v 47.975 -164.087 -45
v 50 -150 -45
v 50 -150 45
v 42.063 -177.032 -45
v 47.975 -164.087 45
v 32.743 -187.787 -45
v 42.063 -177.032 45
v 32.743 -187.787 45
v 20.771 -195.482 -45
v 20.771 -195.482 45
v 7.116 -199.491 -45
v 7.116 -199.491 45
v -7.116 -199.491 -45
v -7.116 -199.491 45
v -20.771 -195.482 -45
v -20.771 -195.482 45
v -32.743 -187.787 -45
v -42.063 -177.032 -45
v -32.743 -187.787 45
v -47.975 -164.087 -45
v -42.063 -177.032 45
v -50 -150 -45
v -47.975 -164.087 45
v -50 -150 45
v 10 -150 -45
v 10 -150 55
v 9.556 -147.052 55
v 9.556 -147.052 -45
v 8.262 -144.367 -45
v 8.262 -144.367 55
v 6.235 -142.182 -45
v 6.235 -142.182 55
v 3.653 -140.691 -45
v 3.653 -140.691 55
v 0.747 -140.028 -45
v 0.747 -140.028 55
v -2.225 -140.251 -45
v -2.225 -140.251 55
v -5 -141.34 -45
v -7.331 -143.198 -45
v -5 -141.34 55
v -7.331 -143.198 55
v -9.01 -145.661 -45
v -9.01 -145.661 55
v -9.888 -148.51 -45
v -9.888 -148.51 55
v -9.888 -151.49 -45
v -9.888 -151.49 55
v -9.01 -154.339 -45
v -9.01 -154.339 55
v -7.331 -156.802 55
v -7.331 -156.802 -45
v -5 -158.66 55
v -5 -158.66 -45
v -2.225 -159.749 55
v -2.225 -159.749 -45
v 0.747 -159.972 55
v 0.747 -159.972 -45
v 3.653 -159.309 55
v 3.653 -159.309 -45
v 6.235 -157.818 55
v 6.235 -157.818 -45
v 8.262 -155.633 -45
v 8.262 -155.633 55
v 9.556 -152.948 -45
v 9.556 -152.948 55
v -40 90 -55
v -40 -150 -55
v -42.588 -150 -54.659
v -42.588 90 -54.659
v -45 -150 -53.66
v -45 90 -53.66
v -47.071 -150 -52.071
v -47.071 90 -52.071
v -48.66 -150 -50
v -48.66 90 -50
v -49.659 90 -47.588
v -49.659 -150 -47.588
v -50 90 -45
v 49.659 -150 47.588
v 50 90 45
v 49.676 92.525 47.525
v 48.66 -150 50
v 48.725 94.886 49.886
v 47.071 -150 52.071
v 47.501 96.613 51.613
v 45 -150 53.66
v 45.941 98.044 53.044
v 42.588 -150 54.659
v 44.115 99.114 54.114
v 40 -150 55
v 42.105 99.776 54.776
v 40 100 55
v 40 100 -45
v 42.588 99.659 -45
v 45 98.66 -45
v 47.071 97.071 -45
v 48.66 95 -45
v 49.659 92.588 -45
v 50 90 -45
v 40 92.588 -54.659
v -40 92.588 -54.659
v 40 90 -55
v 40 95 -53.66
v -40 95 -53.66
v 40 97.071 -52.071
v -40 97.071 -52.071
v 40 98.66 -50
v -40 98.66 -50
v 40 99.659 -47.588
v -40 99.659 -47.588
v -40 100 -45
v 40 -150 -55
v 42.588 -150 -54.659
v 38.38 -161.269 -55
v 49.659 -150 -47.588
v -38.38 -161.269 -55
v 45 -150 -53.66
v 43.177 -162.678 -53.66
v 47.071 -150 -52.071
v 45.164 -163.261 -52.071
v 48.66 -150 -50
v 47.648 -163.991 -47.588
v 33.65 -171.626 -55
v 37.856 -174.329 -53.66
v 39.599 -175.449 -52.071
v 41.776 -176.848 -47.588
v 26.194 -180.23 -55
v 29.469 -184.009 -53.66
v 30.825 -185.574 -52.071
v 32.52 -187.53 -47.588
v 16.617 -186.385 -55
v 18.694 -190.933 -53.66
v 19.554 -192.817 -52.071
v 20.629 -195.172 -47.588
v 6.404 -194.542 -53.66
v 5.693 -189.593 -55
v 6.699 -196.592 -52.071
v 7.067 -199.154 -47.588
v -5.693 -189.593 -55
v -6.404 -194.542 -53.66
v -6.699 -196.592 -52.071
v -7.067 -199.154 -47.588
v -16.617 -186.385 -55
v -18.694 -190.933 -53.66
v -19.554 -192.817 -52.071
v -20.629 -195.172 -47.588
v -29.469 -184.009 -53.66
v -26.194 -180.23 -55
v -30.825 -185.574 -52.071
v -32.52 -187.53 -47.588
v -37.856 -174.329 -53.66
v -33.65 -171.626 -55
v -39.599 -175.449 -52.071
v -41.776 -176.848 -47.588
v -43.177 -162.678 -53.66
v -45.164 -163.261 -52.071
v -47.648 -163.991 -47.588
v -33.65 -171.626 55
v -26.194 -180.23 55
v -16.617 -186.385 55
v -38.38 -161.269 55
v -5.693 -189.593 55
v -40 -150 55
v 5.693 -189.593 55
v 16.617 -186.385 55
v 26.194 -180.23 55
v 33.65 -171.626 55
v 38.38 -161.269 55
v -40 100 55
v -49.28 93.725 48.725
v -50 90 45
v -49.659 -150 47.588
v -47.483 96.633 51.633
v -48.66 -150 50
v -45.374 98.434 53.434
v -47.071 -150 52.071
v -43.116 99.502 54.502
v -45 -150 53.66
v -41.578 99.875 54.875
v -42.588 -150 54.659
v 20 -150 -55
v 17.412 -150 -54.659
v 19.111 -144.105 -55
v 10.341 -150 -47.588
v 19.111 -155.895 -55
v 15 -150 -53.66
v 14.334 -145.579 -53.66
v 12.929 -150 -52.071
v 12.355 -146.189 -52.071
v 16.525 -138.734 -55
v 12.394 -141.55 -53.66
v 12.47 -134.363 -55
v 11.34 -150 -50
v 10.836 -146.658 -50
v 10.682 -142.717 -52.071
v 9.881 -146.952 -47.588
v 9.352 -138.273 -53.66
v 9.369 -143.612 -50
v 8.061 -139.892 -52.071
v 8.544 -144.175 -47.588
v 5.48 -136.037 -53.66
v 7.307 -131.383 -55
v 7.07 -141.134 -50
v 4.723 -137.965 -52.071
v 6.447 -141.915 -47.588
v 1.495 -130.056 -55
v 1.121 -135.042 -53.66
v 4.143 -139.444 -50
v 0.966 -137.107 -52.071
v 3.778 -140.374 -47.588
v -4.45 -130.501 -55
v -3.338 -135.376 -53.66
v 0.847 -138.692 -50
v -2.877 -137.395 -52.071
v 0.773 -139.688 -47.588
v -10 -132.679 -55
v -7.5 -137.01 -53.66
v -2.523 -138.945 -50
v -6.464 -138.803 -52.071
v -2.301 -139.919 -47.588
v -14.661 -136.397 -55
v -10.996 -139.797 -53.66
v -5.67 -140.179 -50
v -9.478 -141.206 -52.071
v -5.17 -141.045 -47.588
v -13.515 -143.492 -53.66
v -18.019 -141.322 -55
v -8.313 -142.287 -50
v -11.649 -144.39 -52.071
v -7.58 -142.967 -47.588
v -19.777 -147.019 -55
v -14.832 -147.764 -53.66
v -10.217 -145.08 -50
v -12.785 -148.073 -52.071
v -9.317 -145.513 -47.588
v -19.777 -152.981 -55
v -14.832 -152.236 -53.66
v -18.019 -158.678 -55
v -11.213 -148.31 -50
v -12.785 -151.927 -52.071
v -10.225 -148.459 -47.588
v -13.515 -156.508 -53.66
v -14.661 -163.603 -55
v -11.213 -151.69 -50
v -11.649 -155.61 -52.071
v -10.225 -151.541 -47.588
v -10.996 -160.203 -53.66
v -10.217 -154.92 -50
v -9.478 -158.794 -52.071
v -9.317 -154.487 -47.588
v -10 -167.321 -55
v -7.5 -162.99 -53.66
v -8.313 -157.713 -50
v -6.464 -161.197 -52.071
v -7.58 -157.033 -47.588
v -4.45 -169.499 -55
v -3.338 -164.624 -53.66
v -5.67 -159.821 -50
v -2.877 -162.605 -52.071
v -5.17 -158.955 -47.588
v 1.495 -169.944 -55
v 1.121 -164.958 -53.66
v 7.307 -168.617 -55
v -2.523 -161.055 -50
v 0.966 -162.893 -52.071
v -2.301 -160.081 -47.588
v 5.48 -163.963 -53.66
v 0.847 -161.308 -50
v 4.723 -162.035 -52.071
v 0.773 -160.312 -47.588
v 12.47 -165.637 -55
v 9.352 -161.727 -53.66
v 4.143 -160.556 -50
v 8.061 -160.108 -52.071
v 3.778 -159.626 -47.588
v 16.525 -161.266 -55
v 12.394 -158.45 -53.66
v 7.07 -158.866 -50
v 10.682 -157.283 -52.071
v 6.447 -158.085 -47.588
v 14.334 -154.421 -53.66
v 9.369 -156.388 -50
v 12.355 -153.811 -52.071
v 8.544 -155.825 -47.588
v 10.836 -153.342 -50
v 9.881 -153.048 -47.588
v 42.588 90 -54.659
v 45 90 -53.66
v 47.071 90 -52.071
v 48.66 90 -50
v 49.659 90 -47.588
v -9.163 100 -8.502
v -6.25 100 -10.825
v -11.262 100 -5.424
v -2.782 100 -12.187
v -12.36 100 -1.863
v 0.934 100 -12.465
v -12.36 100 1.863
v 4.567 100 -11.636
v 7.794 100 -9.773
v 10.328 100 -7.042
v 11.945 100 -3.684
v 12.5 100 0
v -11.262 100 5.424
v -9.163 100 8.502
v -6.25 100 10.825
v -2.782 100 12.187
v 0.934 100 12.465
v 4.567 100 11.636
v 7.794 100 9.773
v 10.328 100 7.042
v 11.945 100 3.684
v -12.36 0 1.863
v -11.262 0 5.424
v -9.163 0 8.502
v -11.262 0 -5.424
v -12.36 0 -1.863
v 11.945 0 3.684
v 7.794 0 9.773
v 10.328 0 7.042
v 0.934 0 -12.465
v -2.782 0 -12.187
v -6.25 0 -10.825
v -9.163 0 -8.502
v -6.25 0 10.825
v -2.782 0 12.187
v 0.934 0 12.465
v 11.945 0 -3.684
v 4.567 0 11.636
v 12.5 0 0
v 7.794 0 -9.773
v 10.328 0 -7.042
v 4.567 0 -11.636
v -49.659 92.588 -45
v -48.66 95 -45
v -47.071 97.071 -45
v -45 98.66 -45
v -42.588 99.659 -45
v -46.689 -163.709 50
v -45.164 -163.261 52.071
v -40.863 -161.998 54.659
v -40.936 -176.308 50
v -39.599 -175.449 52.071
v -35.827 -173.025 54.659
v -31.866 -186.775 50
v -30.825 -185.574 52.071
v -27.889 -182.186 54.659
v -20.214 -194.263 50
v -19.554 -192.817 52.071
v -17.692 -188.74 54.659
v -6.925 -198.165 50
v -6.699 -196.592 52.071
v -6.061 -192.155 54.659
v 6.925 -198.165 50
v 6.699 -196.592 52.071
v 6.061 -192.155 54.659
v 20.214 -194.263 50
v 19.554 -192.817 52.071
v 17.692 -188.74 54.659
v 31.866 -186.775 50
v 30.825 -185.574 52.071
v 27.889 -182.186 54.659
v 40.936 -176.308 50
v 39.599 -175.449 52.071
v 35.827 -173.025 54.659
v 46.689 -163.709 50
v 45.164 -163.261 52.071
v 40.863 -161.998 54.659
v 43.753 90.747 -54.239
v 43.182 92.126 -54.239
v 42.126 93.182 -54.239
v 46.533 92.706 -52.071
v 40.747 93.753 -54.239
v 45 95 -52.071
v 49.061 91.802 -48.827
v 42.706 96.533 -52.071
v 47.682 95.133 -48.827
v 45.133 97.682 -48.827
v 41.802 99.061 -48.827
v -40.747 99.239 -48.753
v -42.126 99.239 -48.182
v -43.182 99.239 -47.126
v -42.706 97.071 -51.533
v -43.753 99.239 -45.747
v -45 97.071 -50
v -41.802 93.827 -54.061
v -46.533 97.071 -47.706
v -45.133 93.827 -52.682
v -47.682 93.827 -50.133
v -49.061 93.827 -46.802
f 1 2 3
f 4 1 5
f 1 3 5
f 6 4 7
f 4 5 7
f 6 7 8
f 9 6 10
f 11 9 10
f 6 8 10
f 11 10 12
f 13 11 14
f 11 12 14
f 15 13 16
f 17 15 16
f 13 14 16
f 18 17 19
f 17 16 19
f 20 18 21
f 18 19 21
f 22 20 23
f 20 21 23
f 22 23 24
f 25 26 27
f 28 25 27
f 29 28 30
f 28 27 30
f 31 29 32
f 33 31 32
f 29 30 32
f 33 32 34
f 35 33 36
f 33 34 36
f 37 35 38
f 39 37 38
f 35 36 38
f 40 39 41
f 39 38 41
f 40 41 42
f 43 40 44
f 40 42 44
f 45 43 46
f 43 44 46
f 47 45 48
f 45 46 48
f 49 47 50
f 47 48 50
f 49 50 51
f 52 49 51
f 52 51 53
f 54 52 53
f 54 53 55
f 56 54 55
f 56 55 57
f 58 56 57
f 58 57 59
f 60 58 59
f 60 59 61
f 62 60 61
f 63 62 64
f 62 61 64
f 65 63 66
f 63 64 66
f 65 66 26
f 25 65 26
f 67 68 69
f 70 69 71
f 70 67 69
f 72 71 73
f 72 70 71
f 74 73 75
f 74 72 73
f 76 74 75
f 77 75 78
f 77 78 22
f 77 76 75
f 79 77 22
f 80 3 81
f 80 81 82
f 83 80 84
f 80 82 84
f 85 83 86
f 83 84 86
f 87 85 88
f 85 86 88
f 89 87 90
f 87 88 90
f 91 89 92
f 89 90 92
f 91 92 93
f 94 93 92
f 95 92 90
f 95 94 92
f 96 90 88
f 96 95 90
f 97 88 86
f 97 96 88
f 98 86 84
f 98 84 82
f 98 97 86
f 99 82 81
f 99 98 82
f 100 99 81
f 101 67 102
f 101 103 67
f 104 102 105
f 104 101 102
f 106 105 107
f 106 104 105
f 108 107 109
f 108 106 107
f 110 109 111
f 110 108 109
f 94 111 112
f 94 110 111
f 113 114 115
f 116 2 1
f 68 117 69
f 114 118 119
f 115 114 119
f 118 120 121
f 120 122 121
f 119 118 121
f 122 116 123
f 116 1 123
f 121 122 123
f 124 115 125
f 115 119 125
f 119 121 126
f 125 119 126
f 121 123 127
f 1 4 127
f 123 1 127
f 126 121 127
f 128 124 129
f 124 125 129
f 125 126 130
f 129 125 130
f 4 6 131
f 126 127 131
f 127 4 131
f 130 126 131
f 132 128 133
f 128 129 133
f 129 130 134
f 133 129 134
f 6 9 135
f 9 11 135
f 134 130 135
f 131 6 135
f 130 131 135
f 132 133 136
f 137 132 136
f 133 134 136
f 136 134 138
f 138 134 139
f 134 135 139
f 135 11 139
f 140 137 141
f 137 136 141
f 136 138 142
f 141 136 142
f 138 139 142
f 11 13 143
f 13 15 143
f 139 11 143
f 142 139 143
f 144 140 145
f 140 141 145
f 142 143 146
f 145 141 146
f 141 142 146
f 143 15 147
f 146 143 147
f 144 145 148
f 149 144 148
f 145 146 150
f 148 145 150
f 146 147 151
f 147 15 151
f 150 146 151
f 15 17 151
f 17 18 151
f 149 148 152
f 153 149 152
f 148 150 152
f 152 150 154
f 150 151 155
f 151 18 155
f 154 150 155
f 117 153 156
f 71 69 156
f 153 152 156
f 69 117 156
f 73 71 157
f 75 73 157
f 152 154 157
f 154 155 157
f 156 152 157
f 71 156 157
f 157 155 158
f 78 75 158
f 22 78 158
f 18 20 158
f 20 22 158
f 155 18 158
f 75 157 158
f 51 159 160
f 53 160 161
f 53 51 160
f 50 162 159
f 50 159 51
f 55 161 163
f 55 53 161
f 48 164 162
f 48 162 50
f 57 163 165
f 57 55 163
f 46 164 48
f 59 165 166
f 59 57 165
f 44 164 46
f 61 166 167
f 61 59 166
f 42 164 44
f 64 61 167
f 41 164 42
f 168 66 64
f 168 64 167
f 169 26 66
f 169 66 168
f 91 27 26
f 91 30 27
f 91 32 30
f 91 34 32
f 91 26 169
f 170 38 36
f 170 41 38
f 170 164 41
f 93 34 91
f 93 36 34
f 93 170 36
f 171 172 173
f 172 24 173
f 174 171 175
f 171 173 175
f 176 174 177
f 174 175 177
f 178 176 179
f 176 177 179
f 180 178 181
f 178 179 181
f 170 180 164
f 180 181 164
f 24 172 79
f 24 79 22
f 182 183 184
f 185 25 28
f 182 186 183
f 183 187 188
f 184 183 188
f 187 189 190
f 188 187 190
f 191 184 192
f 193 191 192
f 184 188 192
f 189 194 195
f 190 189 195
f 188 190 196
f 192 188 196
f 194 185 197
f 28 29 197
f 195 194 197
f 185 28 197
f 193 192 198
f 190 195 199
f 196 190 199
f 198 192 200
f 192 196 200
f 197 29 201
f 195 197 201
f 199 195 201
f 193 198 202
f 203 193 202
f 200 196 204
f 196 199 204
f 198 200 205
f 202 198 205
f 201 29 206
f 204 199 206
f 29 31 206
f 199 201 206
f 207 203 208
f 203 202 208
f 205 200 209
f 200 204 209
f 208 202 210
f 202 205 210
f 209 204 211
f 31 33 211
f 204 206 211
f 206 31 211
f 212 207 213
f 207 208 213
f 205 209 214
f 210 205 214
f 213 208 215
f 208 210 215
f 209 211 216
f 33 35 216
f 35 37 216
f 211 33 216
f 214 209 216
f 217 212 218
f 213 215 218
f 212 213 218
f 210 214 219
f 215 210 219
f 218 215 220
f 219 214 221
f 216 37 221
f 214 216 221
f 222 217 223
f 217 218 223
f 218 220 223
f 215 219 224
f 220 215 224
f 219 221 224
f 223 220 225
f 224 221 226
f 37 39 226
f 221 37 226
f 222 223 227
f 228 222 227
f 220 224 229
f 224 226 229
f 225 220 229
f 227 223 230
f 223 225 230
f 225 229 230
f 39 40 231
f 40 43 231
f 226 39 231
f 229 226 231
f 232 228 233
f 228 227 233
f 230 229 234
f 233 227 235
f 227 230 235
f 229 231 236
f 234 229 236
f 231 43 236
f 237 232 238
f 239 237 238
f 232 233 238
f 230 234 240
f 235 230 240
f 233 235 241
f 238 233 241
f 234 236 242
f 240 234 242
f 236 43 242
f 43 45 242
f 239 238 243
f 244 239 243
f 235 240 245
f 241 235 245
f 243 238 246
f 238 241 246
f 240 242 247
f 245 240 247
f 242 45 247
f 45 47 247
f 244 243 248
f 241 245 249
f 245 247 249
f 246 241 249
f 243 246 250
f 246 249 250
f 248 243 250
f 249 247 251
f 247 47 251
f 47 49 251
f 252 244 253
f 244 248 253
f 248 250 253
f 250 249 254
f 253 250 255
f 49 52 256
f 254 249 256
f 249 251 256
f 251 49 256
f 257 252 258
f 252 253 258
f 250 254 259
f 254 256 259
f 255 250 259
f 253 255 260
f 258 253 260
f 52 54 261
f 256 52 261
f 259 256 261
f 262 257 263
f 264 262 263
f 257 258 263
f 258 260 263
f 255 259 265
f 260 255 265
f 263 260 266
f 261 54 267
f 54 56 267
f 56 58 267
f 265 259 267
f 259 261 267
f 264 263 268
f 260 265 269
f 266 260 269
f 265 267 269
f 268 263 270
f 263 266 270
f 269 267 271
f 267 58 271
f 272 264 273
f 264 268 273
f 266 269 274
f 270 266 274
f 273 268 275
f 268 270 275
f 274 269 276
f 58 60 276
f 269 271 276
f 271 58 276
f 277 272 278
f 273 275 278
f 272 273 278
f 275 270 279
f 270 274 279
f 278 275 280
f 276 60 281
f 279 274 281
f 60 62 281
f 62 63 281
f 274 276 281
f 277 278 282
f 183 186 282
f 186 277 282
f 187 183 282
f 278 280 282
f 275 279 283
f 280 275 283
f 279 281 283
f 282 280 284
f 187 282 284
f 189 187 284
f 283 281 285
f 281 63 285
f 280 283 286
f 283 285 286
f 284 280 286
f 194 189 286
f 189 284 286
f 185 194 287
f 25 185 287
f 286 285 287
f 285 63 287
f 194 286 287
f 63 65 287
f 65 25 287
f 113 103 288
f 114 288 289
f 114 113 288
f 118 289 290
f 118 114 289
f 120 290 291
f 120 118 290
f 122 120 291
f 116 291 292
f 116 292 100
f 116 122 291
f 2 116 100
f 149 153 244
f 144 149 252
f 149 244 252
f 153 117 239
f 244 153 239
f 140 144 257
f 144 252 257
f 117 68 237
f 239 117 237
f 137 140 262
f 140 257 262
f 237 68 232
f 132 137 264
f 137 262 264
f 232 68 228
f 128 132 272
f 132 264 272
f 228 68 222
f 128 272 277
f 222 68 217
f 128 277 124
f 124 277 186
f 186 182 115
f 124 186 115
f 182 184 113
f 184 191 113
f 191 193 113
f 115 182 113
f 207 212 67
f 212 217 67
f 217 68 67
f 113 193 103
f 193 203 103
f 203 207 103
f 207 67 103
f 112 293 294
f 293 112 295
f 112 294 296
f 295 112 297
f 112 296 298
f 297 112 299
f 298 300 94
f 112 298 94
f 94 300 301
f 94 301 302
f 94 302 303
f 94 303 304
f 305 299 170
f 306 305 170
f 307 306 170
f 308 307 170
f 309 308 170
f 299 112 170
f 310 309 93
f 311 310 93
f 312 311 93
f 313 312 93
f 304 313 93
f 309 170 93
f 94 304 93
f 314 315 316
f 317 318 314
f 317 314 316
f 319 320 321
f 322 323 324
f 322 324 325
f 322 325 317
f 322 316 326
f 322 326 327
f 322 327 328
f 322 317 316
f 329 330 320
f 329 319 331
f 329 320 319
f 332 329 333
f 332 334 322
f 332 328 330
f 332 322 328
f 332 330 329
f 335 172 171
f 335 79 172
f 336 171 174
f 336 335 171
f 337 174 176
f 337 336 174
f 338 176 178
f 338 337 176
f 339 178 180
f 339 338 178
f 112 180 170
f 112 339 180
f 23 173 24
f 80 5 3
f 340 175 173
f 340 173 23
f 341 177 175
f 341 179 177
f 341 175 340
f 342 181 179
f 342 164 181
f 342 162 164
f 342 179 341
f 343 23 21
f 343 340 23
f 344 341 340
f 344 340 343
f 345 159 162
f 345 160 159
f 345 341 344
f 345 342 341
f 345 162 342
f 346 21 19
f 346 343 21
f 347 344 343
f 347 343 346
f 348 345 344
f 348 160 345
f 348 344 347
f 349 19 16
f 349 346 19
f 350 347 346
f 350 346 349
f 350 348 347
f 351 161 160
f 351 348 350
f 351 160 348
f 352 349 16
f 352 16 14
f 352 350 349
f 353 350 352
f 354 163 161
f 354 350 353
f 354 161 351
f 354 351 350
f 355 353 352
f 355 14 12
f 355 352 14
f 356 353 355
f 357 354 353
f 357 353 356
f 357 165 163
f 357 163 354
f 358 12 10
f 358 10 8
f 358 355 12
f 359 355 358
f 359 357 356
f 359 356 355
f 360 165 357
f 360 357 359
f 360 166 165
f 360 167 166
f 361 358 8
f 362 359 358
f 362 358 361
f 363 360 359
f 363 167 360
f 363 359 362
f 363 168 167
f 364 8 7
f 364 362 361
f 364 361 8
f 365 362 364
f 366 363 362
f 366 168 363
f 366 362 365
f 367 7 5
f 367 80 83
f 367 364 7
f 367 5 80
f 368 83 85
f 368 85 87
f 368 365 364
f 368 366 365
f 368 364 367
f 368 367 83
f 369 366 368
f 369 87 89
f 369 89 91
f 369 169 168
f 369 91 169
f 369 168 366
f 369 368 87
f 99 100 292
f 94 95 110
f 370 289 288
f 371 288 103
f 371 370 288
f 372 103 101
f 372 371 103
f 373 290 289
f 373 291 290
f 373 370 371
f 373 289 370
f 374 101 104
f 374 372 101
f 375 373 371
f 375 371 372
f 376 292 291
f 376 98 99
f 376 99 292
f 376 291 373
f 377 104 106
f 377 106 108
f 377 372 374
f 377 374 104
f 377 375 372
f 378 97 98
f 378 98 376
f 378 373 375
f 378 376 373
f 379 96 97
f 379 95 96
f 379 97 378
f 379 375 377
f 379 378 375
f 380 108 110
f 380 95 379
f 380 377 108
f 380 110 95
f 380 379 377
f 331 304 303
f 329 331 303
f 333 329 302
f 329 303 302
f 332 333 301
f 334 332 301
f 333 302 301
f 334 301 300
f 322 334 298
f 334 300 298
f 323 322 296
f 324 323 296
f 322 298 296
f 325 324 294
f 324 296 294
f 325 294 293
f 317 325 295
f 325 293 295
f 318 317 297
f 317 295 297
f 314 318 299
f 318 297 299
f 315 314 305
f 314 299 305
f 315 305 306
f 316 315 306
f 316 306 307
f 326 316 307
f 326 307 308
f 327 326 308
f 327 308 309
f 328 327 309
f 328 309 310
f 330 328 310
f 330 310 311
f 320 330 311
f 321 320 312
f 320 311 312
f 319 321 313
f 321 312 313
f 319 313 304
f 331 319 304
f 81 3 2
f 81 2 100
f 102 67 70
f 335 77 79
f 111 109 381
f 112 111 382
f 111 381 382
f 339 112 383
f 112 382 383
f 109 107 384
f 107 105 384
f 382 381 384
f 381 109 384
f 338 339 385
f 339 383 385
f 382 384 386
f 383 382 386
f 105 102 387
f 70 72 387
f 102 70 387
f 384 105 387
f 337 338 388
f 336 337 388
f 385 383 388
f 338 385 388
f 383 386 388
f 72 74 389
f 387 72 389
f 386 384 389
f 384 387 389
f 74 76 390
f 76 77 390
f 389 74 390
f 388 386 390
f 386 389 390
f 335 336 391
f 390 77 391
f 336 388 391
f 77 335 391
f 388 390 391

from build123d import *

# Parameters (mm, degrees)
SKETCH2_W           = 100
SKETCH2_H           = 200
BOSS_EXTRUDE1_DEPTH = 55
SKETCH3_R           = 10
CUT_EXTRUDE1_DEPTH  = 110
SKETCH4_R           = 12.5
CUT_EXTRUDE2_DEPTH  = 100
FILLET1_R           = 10


with BuildPart() as part:
    # Sketch2 → Boss-Extrude1 (new body, symmetric)
    with BuildSketch(Plane.XY):
        Rectangle(SKETCH2_W, SKETCH2_H)
        with BuildLine():
            ThreePointArc((50, -150), (0, -200), (-50, -150))
            Line((-50, -150), (-50, -100))
            Line((-50, -100), (50, -100))
            Line((50, -100), (50, -150))
        make_face()
    extrude(amount=BOSS_EXTRUDE1_DEPTH, both=True)

    # Sketch3 → Cut-Extrude1 (cut)
    with BuildSketch(Plane.XY.offset(55)):
        with Locations((0, -150)):
            Circle(SKETCH3_R)
    extrude(amount=-CUT_EXTRUDE1_DEPTH, mode=Mode.SUBTRACT)

    # Sketch4 → Cut-Extrude2 (cut)
    with BuildSketch(Plane(origin=(0, 100, 0), x_dir=(1, 0, 0), z_dir=(0, 1, 0))):
        Circle(SKETCH4_R)
    extrude(amount=-CUT_EXTRUDE2_DEPTH, mode=Mode.SUBTRACT)

    # Fillet1
    fillet1_edges = [part.edges().sort_by_distance(p)[0] for p in [
        (50, 100, 0),
        (-50, -25, 55),
        (-10, -150, -55),
        (0, -200, 55),
        (50, -25, 55),
        (0, -200, -55),
        (-50, -25, -55),
        (0, 100, -55),
        (50, -25, -55),
        (-50, 100, 0),
    ]]
    fillet(fillet1_edges, radius=FILLET1_R)


solid = part.part
